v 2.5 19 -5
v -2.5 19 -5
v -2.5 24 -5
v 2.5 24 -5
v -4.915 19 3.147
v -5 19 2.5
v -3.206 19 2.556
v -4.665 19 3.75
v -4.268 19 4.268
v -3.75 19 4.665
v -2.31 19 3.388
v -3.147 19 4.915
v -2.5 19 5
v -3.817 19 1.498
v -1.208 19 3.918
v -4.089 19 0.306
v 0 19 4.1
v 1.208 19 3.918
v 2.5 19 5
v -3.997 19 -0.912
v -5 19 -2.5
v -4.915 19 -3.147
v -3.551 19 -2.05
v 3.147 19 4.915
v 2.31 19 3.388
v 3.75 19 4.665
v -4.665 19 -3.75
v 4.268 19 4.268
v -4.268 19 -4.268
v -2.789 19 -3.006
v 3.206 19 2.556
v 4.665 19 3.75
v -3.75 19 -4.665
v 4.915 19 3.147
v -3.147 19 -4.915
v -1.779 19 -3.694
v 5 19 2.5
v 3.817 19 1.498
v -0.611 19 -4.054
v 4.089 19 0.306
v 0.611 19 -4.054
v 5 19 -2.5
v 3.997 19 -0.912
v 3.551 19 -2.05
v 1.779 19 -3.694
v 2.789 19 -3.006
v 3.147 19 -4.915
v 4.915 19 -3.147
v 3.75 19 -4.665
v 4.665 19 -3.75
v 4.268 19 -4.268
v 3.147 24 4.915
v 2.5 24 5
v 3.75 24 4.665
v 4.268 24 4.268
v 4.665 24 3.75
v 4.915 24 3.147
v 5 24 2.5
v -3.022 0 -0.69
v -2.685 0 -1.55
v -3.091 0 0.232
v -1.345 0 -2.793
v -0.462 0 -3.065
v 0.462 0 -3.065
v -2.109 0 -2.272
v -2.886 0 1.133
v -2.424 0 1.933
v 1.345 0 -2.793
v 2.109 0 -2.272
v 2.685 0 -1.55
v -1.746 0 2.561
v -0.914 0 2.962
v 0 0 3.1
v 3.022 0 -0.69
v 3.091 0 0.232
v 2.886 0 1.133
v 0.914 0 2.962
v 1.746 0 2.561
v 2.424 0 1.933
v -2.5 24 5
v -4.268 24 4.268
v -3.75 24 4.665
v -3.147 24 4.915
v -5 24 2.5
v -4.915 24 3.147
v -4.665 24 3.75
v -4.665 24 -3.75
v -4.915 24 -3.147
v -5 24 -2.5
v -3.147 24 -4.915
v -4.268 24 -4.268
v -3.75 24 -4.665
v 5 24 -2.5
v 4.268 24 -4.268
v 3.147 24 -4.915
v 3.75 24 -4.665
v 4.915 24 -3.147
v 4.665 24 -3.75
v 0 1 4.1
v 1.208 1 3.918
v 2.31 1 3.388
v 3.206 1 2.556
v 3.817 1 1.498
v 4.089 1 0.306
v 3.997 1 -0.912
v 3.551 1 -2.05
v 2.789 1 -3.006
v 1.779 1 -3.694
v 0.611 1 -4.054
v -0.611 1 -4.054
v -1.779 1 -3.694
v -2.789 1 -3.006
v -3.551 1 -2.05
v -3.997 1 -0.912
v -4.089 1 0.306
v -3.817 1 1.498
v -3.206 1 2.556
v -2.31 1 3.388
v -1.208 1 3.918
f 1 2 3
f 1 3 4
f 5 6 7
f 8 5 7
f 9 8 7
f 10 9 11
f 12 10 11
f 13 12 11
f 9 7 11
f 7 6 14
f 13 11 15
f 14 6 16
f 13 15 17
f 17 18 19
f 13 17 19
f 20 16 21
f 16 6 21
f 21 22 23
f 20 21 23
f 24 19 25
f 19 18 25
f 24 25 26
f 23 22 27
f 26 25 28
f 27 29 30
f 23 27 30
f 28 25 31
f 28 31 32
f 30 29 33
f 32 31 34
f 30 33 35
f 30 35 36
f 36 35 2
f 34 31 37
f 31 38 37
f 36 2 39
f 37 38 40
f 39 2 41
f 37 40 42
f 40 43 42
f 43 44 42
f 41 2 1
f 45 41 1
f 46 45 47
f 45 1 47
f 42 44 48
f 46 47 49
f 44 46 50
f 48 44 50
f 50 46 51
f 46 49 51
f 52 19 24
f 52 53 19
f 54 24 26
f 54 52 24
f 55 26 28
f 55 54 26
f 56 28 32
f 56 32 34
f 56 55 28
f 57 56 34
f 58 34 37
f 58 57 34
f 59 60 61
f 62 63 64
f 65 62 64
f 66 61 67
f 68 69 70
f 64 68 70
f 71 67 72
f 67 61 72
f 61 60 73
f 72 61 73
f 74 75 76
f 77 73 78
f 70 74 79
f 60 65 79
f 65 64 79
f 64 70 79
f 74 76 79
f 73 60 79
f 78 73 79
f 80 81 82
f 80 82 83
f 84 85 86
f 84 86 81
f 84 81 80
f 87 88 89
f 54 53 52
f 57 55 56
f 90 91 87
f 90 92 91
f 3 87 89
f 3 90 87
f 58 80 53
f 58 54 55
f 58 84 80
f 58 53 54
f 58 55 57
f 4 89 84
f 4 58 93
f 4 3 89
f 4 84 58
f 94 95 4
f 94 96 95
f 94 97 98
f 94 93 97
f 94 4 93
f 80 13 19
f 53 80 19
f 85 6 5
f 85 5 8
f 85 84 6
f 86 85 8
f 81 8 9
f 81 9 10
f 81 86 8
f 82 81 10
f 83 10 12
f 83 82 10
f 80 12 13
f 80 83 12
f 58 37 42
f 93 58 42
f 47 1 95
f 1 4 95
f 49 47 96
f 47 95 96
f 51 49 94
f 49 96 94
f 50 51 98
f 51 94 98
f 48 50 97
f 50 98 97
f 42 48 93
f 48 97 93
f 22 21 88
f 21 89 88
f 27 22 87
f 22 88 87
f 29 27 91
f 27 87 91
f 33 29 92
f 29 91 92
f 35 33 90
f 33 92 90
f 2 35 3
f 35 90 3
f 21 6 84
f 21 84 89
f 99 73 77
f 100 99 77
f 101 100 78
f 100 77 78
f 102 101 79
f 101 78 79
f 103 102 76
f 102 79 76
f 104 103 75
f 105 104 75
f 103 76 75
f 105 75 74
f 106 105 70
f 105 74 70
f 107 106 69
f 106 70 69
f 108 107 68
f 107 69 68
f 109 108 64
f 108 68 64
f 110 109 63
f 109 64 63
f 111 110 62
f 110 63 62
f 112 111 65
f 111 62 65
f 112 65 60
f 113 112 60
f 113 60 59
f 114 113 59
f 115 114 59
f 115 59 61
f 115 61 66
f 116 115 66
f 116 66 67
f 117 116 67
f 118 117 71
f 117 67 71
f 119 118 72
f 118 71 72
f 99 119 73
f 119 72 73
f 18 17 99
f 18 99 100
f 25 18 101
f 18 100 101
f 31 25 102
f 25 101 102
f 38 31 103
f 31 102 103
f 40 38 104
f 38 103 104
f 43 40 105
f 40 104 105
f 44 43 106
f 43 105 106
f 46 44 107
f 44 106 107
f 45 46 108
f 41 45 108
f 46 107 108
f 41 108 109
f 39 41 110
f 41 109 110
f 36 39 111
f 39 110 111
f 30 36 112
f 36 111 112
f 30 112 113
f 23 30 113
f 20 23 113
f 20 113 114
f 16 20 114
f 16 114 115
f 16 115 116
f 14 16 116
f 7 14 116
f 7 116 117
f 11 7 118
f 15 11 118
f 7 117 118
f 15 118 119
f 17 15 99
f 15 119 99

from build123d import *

# Parameters (mm, degrees)
SKETCH1_R           = 4.1
BOSS_EXTRUDE1_DEPTH = 19
SKETCH2_W           = 10
SKETCH2_H           = 10
BOSS_EXTRUDE2_DEPTH = 5
FILLET1_R           = 2.5
CHAMFER1_SIZE       = 1


with BuildPart() as part:
    # Sketch1 → Boss-Extrude1 (new body)
    with BuildSketch(Plane(origin=(0, 0, 0), x_dir=(1, 0, 0), z_dir=(0, 1, 0))):
        with Locations(Location((0, 0, 0), (0, 0, 270))):
            Circle(SKETCH1_R)
    extrude(amount=BOSS_EXTRUDE1_DEPTH)

    # Sketch2 → Boss-Extrude2 (add)
    with BuildSketch(Plane(origin=(0, 19, 0), x_dir=(1, 0, 0), z_dir=(0, 1, 0))):
        Rectangle(SKETCH2_W, SKETCH2_H)
    extrude(amount=BOSS_EXTRUDE2_DEPTH)

    # Fillet1
    fillet1_edges = [part.edges().sort_by_distance(p)[0] for p in [
        (5, 21.5, 5),
        (5, 21.5, -5),
        (-5, 21.5, -5),
        (-5, 21.5, 5),
    ]]
    fillet(fillet1_edges, radius=FILLET1_R)

    # Chamfer1
    chamfer1_edges = [part.edges().sort_by_distance(p)[0] for p in [
        (0, 0, -4.1),
    ]]
    chamfer(chamfer1_edges, length=CHAMFER1_SIZE)


solid = part.part
